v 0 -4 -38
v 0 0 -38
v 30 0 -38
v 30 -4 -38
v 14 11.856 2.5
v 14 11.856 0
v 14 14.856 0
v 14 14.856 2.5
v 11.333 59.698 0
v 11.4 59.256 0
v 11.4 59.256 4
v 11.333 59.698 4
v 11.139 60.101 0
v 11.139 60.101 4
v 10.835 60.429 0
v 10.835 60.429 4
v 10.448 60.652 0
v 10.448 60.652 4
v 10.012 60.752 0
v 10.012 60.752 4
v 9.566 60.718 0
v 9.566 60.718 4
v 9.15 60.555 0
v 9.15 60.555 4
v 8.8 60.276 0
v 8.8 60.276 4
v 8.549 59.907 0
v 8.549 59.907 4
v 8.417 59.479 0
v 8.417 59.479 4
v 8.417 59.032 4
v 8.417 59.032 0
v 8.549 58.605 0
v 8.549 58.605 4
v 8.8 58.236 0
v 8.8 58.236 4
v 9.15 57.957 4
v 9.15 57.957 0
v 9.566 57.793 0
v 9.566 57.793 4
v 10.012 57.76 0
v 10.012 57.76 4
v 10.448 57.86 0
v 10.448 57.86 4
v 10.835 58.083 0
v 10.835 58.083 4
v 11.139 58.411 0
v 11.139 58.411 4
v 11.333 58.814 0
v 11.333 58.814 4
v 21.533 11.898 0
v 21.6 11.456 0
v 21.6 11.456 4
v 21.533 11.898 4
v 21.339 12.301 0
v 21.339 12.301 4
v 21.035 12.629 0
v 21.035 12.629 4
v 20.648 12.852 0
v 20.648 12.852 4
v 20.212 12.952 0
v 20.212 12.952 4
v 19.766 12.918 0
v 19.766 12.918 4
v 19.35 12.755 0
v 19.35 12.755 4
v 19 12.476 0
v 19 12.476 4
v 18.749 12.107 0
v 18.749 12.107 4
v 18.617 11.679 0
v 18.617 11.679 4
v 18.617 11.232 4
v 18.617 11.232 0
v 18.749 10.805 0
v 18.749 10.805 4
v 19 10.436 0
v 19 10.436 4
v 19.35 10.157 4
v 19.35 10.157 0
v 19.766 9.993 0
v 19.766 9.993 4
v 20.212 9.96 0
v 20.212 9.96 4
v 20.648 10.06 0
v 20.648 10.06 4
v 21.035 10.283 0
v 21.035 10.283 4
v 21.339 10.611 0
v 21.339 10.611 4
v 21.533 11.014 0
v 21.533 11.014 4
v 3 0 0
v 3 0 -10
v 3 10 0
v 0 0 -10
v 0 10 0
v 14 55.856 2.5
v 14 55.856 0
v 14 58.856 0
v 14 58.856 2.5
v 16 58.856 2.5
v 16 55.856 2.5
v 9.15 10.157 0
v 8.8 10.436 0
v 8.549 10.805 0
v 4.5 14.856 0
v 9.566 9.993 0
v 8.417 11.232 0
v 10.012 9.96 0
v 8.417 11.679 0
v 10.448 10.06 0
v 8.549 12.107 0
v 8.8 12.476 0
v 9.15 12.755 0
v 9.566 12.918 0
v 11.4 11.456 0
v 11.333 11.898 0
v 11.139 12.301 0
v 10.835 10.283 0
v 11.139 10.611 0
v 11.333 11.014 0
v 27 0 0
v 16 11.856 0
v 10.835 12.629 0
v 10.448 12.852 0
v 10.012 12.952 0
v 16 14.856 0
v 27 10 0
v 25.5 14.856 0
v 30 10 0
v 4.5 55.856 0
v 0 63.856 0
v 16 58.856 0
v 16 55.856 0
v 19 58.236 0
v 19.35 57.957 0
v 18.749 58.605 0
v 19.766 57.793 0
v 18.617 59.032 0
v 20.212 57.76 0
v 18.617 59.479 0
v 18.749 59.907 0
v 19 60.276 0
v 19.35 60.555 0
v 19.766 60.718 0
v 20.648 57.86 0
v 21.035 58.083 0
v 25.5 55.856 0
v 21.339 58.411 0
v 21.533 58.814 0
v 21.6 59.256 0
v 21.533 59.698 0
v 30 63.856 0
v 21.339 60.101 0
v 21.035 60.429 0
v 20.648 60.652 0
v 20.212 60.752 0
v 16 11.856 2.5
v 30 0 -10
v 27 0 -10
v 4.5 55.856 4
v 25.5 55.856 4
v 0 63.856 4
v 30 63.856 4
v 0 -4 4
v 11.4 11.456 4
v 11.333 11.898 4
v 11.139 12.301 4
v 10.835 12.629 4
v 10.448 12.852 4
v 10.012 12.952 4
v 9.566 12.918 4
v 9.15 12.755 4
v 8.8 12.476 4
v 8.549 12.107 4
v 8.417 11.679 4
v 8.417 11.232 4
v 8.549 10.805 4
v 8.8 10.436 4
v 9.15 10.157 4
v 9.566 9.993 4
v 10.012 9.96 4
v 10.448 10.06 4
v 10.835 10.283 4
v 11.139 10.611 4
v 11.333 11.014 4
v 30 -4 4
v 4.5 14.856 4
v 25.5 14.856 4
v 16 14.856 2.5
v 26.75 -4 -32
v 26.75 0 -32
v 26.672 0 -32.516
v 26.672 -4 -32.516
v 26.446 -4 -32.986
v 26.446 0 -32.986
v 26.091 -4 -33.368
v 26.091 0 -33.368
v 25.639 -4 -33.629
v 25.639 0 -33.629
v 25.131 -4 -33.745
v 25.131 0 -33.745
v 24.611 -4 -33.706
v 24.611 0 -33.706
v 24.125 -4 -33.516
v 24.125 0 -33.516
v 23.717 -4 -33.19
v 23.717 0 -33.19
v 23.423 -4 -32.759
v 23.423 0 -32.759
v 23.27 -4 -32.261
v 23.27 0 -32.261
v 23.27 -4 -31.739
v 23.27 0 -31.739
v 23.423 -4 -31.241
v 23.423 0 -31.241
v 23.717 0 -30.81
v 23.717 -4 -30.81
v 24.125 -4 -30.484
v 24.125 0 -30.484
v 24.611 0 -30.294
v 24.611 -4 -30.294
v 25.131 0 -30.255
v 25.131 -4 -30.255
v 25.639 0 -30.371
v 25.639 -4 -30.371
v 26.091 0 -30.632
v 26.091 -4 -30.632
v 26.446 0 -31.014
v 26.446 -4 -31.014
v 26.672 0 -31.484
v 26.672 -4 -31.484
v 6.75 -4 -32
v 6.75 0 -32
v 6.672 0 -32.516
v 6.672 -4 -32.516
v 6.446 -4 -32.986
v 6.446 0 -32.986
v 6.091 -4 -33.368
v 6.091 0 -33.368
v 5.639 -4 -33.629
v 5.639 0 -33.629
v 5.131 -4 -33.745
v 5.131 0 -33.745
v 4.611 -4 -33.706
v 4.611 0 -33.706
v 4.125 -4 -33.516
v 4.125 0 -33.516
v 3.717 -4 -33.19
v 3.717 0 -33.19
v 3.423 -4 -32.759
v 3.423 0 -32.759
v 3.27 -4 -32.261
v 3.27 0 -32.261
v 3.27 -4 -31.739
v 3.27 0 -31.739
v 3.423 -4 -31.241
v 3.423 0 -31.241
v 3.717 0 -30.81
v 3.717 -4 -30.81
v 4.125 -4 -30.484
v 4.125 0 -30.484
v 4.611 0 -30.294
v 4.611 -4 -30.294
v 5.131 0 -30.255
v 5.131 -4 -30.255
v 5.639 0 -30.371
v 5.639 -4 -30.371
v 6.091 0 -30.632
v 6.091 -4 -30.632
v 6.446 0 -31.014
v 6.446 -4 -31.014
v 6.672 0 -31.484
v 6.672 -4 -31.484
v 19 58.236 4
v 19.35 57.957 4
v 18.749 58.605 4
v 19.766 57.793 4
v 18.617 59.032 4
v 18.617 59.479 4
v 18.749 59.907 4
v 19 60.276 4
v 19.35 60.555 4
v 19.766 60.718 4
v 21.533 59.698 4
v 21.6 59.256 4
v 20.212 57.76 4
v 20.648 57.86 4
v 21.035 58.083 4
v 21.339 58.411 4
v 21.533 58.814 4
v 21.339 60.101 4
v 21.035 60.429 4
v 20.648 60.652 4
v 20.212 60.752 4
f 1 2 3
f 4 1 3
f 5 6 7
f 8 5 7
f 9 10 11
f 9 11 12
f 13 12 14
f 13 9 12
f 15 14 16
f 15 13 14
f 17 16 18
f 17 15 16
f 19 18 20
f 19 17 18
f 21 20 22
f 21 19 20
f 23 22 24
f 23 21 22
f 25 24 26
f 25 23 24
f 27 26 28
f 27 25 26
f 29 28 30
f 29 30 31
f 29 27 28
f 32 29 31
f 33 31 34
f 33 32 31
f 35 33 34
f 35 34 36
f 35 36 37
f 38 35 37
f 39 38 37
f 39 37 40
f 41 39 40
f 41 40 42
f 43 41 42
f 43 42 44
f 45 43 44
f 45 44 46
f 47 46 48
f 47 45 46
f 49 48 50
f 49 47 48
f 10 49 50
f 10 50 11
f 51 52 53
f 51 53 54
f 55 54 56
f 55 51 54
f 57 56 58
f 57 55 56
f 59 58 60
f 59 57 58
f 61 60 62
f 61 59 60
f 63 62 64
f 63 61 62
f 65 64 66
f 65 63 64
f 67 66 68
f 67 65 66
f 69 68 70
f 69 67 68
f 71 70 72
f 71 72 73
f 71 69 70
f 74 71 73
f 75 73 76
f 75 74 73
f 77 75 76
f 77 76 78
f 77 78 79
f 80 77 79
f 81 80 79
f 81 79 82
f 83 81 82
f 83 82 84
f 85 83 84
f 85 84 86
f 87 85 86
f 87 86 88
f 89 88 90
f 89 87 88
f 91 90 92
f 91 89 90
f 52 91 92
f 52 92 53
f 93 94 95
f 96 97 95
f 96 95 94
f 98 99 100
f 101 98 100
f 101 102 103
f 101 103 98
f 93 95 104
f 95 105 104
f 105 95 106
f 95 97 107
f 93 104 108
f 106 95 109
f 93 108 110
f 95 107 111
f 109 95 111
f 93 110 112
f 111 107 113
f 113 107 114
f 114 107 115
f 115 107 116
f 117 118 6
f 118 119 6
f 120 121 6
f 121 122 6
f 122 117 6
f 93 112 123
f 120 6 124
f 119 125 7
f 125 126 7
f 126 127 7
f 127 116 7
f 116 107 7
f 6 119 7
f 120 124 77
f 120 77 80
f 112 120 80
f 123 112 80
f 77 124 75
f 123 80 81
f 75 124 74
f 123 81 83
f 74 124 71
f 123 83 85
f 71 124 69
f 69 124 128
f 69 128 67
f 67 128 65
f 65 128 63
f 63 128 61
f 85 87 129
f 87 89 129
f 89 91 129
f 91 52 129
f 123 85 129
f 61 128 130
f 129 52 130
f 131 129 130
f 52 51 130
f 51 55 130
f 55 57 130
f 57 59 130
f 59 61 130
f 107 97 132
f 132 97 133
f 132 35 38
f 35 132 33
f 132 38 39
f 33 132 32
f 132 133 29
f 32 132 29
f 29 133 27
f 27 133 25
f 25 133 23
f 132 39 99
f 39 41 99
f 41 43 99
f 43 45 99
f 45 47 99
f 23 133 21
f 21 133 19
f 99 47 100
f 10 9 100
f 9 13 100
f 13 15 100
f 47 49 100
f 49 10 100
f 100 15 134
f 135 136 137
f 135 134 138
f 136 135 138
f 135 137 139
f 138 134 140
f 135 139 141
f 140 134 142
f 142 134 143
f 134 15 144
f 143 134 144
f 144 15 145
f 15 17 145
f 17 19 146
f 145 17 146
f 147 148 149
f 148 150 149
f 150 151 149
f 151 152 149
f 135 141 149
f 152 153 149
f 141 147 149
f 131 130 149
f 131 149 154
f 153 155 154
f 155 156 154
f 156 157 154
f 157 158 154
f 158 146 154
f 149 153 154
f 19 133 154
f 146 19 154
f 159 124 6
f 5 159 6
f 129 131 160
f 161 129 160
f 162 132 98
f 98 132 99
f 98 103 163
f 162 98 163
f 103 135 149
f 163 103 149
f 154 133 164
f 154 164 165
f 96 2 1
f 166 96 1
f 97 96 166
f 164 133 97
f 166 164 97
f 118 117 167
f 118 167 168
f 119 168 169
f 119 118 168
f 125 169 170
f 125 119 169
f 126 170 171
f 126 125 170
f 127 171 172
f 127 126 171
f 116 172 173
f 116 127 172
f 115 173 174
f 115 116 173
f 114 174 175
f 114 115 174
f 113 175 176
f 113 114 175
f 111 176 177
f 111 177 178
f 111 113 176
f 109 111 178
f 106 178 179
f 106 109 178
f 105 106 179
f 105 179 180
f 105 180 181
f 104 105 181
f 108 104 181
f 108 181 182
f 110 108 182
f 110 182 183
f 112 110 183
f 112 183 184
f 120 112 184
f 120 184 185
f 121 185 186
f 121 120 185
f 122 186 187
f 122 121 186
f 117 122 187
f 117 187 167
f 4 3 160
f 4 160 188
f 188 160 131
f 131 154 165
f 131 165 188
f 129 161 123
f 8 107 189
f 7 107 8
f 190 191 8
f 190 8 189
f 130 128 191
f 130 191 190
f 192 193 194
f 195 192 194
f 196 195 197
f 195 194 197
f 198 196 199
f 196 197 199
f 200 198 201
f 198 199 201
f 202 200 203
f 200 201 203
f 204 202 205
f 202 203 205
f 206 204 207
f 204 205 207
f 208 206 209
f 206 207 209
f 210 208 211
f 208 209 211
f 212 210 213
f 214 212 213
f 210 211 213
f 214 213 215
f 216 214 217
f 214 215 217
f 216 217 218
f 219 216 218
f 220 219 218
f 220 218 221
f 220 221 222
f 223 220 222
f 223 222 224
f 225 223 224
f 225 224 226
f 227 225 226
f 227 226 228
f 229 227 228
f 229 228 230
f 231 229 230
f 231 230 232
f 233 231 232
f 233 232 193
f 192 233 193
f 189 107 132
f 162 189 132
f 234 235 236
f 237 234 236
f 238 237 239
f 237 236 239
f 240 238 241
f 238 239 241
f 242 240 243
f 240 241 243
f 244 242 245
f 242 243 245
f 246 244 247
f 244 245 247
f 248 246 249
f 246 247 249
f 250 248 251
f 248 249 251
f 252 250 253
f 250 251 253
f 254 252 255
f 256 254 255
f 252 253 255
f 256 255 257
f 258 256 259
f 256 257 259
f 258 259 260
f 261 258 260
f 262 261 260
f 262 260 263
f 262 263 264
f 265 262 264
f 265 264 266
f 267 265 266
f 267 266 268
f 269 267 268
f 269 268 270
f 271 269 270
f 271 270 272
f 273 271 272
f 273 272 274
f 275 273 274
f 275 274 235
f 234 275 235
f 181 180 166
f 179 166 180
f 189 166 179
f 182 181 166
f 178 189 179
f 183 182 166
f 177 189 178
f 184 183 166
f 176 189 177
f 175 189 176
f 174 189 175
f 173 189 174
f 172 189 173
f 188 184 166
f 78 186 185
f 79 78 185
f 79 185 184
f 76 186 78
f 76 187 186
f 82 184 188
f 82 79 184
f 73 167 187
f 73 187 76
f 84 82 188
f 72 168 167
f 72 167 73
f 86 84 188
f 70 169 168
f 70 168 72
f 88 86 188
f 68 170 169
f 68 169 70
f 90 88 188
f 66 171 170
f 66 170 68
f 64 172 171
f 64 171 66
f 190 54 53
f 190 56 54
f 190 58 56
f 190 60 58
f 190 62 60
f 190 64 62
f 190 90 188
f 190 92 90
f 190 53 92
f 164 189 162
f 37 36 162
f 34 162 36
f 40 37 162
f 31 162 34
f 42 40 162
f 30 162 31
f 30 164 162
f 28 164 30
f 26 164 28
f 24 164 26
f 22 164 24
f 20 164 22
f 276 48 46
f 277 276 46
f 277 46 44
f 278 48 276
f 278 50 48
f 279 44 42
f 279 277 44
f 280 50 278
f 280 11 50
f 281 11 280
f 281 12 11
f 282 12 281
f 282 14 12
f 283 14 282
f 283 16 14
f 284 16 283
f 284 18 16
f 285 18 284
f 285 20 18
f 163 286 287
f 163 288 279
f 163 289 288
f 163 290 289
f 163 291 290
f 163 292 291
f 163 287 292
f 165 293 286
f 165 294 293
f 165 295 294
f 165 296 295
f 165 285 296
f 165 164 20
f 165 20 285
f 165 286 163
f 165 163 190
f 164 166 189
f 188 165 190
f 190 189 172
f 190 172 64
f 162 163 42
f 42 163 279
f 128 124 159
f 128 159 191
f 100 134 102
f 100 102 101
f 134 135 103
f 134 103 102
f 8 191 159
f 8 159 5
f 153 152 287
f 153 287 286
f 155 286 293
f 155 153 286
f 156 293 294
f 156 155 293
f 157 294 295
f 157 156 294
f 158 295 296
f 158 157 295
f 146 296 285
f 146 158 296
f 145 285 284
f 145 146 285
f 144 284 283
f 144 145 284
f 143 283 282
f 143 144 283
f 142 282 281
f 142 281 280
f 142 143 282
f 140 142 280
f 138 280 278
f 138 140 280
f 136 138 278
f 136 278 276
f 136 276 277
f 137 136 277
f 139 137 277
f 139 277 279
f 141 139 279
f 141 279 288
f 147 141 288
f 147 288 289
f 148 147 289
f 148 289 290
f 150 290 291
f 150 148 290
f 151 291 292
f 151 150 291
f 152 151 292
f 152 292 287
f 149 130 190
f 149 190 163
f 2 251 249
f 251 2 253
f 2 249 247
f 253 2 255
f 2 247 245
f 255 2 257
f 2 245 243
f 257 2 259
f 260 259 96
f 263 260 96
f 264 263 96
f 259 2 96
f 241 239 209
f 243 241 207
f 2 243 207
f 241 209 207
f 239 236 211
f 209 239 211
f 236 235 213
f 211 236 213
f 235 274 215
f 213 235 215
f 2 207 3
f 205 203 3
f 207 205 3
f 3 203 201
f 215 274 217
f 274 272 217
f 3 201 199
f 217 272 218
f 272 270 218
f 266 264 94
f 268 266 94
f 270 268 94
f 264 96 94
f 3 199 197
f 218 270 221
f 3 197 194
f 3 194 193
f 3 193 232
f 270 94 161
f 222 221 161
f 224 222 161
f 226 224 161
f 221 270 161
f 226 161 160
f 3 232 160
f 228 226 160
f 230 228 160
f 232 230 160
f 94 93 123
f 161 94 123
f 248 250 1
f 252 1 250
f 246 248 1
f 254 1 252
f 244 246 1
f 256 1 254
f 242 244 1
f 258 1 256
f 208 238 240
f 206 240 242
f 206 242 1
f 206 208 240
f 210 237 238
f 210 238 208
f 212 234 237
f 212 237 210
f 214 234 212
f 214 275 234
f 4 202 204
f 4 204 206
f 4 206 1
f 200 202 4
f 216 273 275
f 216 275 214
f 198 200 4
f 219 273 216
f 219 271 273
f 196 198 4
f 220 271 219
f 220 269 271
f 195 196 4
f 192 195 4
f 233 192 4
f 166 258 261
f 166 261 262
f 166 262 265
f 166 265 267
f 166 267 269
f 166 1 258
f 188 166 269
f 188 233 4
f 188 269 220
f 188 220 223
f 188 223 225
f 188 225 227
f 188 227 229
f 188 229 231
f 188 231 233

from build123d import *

# Parameters (mm, degrees)
SKETCH_1_W          = 30
SKETCH_1_H          = 63.8558669
SKETCH_1_R          = 1.5
SKETCH_1_W_2        = 21
SKETCH_1_H_2        = 41
EXTRUDE_1_DEPTH     = 4
SKETCH_2_W          = 2
SKETCH_2_H          = 3
CUT_EXTRUDE_1_DEPTH = 2.5
SKETCH_3_W          = 30
SKETCH_3_H          = 42
EXTRUDE_2_DEPTH     = 4
SKETCH_4_R          = 1.75
CUT_EXTRUDE_2_DEPTH = 5
EXTRUDE_3_DEPTH     = 3
EXTRUDE_4_DEPTH     = 3


with BuildPart() as part:
    # 草圖1 → 填料-伸長1 (new body)
    with BuildSketch(Plane.XY):
        with Locations((15, 31.92793345)):
            Rectangle(SKETCH_1_W, SKETCH_1_H)
        with Locations((9.9, 59.2558669)):
            Circle(SKETCH_1_R, mode=Mode.SUBTRACT)
        with Locations((20.1, 59.2558669)):
            Circle(SKETCH_1_R, mode=Mode.SUBTRACT)
        with Locations((20.1, 11.4558669)):
            Circle(SKETCH_1_R, mode=Mode.SUBTRACT)
        with Locations((9.9, 11.4558669)):
            Circle(SKETCH_1_R, mode=Mode.SUBTRACT)
        with Locations((15, 35.3558669)):
            Rectangle(SKETCH_1_W_2, SKETCH_1_H_2, mode=Mode.SUBTRACT)
    extrude(amount=EXTRUDE_1_DEPTH)

    # 草圖2 → 除料-伸長1 (cut)
    with BuildSketch(Plane(origin=(0, 0, 0), x_dir=(-1, 0, 0), z_dir=(0, 0, -1))):
        with Locations((-15, 57.3558669)):
            Rectangle(SKETCH_2_W, SKETCH_2_H)
        with Locations((-15, 13.3558669)):
            Rectangle(SKETCH_2_W, SKETCH_2_H)
    extrude(amount=-CUT_EXTRUDE_1_DEPTH, mode=Mode.SUBTRACT)

    # 草圖3 → 填料-伸長2 (add)
    with BuildSketch(Plane.XZ):
        with Locations((15, -17)):
            Rectangle(SKETCH_3_W, SKETCH_3_H)
    extrude(amount=EXTRUDE_2_DEPTH)

    # 草圖4 → 除料-伸長2 (cut, through all)
    with BuildSketch(Plane(origin=(0, 0, 0), x_dir=(1, 0, 0), z_dir=(0, 1, 0))):
        with Locations((5, 32)):
            Circle(SKETCH_4_R)
        with Locations((25, 32)):
            Circle(SKETCH_4_R)
    extrude(amount=-CUT_EXTRUDE_2_DEPTH, mode=Mode.SUBTRACT)

    # 草圖5 → 填料-伸長3 (add)
    with BuildSketch(Plane(origin=(30, 0, 0), x_dir=(0, 0, -1), z_dir=(1, 0, 0))):
        Polygon((0, 10), (10, 0), (0, 0), align=None)
    extrude(amount=-EXTRUDE_3_DEPTH)

    # 草圖6 → 填料-伸長4 (add)
    with BuildSketch(Plane.ZY):
        Polygon((0, 0), (0, 10), (-10, 0), align=None)
    extrude(amount=-EXTRUDE_4_DEPTH)


solid = part.part
